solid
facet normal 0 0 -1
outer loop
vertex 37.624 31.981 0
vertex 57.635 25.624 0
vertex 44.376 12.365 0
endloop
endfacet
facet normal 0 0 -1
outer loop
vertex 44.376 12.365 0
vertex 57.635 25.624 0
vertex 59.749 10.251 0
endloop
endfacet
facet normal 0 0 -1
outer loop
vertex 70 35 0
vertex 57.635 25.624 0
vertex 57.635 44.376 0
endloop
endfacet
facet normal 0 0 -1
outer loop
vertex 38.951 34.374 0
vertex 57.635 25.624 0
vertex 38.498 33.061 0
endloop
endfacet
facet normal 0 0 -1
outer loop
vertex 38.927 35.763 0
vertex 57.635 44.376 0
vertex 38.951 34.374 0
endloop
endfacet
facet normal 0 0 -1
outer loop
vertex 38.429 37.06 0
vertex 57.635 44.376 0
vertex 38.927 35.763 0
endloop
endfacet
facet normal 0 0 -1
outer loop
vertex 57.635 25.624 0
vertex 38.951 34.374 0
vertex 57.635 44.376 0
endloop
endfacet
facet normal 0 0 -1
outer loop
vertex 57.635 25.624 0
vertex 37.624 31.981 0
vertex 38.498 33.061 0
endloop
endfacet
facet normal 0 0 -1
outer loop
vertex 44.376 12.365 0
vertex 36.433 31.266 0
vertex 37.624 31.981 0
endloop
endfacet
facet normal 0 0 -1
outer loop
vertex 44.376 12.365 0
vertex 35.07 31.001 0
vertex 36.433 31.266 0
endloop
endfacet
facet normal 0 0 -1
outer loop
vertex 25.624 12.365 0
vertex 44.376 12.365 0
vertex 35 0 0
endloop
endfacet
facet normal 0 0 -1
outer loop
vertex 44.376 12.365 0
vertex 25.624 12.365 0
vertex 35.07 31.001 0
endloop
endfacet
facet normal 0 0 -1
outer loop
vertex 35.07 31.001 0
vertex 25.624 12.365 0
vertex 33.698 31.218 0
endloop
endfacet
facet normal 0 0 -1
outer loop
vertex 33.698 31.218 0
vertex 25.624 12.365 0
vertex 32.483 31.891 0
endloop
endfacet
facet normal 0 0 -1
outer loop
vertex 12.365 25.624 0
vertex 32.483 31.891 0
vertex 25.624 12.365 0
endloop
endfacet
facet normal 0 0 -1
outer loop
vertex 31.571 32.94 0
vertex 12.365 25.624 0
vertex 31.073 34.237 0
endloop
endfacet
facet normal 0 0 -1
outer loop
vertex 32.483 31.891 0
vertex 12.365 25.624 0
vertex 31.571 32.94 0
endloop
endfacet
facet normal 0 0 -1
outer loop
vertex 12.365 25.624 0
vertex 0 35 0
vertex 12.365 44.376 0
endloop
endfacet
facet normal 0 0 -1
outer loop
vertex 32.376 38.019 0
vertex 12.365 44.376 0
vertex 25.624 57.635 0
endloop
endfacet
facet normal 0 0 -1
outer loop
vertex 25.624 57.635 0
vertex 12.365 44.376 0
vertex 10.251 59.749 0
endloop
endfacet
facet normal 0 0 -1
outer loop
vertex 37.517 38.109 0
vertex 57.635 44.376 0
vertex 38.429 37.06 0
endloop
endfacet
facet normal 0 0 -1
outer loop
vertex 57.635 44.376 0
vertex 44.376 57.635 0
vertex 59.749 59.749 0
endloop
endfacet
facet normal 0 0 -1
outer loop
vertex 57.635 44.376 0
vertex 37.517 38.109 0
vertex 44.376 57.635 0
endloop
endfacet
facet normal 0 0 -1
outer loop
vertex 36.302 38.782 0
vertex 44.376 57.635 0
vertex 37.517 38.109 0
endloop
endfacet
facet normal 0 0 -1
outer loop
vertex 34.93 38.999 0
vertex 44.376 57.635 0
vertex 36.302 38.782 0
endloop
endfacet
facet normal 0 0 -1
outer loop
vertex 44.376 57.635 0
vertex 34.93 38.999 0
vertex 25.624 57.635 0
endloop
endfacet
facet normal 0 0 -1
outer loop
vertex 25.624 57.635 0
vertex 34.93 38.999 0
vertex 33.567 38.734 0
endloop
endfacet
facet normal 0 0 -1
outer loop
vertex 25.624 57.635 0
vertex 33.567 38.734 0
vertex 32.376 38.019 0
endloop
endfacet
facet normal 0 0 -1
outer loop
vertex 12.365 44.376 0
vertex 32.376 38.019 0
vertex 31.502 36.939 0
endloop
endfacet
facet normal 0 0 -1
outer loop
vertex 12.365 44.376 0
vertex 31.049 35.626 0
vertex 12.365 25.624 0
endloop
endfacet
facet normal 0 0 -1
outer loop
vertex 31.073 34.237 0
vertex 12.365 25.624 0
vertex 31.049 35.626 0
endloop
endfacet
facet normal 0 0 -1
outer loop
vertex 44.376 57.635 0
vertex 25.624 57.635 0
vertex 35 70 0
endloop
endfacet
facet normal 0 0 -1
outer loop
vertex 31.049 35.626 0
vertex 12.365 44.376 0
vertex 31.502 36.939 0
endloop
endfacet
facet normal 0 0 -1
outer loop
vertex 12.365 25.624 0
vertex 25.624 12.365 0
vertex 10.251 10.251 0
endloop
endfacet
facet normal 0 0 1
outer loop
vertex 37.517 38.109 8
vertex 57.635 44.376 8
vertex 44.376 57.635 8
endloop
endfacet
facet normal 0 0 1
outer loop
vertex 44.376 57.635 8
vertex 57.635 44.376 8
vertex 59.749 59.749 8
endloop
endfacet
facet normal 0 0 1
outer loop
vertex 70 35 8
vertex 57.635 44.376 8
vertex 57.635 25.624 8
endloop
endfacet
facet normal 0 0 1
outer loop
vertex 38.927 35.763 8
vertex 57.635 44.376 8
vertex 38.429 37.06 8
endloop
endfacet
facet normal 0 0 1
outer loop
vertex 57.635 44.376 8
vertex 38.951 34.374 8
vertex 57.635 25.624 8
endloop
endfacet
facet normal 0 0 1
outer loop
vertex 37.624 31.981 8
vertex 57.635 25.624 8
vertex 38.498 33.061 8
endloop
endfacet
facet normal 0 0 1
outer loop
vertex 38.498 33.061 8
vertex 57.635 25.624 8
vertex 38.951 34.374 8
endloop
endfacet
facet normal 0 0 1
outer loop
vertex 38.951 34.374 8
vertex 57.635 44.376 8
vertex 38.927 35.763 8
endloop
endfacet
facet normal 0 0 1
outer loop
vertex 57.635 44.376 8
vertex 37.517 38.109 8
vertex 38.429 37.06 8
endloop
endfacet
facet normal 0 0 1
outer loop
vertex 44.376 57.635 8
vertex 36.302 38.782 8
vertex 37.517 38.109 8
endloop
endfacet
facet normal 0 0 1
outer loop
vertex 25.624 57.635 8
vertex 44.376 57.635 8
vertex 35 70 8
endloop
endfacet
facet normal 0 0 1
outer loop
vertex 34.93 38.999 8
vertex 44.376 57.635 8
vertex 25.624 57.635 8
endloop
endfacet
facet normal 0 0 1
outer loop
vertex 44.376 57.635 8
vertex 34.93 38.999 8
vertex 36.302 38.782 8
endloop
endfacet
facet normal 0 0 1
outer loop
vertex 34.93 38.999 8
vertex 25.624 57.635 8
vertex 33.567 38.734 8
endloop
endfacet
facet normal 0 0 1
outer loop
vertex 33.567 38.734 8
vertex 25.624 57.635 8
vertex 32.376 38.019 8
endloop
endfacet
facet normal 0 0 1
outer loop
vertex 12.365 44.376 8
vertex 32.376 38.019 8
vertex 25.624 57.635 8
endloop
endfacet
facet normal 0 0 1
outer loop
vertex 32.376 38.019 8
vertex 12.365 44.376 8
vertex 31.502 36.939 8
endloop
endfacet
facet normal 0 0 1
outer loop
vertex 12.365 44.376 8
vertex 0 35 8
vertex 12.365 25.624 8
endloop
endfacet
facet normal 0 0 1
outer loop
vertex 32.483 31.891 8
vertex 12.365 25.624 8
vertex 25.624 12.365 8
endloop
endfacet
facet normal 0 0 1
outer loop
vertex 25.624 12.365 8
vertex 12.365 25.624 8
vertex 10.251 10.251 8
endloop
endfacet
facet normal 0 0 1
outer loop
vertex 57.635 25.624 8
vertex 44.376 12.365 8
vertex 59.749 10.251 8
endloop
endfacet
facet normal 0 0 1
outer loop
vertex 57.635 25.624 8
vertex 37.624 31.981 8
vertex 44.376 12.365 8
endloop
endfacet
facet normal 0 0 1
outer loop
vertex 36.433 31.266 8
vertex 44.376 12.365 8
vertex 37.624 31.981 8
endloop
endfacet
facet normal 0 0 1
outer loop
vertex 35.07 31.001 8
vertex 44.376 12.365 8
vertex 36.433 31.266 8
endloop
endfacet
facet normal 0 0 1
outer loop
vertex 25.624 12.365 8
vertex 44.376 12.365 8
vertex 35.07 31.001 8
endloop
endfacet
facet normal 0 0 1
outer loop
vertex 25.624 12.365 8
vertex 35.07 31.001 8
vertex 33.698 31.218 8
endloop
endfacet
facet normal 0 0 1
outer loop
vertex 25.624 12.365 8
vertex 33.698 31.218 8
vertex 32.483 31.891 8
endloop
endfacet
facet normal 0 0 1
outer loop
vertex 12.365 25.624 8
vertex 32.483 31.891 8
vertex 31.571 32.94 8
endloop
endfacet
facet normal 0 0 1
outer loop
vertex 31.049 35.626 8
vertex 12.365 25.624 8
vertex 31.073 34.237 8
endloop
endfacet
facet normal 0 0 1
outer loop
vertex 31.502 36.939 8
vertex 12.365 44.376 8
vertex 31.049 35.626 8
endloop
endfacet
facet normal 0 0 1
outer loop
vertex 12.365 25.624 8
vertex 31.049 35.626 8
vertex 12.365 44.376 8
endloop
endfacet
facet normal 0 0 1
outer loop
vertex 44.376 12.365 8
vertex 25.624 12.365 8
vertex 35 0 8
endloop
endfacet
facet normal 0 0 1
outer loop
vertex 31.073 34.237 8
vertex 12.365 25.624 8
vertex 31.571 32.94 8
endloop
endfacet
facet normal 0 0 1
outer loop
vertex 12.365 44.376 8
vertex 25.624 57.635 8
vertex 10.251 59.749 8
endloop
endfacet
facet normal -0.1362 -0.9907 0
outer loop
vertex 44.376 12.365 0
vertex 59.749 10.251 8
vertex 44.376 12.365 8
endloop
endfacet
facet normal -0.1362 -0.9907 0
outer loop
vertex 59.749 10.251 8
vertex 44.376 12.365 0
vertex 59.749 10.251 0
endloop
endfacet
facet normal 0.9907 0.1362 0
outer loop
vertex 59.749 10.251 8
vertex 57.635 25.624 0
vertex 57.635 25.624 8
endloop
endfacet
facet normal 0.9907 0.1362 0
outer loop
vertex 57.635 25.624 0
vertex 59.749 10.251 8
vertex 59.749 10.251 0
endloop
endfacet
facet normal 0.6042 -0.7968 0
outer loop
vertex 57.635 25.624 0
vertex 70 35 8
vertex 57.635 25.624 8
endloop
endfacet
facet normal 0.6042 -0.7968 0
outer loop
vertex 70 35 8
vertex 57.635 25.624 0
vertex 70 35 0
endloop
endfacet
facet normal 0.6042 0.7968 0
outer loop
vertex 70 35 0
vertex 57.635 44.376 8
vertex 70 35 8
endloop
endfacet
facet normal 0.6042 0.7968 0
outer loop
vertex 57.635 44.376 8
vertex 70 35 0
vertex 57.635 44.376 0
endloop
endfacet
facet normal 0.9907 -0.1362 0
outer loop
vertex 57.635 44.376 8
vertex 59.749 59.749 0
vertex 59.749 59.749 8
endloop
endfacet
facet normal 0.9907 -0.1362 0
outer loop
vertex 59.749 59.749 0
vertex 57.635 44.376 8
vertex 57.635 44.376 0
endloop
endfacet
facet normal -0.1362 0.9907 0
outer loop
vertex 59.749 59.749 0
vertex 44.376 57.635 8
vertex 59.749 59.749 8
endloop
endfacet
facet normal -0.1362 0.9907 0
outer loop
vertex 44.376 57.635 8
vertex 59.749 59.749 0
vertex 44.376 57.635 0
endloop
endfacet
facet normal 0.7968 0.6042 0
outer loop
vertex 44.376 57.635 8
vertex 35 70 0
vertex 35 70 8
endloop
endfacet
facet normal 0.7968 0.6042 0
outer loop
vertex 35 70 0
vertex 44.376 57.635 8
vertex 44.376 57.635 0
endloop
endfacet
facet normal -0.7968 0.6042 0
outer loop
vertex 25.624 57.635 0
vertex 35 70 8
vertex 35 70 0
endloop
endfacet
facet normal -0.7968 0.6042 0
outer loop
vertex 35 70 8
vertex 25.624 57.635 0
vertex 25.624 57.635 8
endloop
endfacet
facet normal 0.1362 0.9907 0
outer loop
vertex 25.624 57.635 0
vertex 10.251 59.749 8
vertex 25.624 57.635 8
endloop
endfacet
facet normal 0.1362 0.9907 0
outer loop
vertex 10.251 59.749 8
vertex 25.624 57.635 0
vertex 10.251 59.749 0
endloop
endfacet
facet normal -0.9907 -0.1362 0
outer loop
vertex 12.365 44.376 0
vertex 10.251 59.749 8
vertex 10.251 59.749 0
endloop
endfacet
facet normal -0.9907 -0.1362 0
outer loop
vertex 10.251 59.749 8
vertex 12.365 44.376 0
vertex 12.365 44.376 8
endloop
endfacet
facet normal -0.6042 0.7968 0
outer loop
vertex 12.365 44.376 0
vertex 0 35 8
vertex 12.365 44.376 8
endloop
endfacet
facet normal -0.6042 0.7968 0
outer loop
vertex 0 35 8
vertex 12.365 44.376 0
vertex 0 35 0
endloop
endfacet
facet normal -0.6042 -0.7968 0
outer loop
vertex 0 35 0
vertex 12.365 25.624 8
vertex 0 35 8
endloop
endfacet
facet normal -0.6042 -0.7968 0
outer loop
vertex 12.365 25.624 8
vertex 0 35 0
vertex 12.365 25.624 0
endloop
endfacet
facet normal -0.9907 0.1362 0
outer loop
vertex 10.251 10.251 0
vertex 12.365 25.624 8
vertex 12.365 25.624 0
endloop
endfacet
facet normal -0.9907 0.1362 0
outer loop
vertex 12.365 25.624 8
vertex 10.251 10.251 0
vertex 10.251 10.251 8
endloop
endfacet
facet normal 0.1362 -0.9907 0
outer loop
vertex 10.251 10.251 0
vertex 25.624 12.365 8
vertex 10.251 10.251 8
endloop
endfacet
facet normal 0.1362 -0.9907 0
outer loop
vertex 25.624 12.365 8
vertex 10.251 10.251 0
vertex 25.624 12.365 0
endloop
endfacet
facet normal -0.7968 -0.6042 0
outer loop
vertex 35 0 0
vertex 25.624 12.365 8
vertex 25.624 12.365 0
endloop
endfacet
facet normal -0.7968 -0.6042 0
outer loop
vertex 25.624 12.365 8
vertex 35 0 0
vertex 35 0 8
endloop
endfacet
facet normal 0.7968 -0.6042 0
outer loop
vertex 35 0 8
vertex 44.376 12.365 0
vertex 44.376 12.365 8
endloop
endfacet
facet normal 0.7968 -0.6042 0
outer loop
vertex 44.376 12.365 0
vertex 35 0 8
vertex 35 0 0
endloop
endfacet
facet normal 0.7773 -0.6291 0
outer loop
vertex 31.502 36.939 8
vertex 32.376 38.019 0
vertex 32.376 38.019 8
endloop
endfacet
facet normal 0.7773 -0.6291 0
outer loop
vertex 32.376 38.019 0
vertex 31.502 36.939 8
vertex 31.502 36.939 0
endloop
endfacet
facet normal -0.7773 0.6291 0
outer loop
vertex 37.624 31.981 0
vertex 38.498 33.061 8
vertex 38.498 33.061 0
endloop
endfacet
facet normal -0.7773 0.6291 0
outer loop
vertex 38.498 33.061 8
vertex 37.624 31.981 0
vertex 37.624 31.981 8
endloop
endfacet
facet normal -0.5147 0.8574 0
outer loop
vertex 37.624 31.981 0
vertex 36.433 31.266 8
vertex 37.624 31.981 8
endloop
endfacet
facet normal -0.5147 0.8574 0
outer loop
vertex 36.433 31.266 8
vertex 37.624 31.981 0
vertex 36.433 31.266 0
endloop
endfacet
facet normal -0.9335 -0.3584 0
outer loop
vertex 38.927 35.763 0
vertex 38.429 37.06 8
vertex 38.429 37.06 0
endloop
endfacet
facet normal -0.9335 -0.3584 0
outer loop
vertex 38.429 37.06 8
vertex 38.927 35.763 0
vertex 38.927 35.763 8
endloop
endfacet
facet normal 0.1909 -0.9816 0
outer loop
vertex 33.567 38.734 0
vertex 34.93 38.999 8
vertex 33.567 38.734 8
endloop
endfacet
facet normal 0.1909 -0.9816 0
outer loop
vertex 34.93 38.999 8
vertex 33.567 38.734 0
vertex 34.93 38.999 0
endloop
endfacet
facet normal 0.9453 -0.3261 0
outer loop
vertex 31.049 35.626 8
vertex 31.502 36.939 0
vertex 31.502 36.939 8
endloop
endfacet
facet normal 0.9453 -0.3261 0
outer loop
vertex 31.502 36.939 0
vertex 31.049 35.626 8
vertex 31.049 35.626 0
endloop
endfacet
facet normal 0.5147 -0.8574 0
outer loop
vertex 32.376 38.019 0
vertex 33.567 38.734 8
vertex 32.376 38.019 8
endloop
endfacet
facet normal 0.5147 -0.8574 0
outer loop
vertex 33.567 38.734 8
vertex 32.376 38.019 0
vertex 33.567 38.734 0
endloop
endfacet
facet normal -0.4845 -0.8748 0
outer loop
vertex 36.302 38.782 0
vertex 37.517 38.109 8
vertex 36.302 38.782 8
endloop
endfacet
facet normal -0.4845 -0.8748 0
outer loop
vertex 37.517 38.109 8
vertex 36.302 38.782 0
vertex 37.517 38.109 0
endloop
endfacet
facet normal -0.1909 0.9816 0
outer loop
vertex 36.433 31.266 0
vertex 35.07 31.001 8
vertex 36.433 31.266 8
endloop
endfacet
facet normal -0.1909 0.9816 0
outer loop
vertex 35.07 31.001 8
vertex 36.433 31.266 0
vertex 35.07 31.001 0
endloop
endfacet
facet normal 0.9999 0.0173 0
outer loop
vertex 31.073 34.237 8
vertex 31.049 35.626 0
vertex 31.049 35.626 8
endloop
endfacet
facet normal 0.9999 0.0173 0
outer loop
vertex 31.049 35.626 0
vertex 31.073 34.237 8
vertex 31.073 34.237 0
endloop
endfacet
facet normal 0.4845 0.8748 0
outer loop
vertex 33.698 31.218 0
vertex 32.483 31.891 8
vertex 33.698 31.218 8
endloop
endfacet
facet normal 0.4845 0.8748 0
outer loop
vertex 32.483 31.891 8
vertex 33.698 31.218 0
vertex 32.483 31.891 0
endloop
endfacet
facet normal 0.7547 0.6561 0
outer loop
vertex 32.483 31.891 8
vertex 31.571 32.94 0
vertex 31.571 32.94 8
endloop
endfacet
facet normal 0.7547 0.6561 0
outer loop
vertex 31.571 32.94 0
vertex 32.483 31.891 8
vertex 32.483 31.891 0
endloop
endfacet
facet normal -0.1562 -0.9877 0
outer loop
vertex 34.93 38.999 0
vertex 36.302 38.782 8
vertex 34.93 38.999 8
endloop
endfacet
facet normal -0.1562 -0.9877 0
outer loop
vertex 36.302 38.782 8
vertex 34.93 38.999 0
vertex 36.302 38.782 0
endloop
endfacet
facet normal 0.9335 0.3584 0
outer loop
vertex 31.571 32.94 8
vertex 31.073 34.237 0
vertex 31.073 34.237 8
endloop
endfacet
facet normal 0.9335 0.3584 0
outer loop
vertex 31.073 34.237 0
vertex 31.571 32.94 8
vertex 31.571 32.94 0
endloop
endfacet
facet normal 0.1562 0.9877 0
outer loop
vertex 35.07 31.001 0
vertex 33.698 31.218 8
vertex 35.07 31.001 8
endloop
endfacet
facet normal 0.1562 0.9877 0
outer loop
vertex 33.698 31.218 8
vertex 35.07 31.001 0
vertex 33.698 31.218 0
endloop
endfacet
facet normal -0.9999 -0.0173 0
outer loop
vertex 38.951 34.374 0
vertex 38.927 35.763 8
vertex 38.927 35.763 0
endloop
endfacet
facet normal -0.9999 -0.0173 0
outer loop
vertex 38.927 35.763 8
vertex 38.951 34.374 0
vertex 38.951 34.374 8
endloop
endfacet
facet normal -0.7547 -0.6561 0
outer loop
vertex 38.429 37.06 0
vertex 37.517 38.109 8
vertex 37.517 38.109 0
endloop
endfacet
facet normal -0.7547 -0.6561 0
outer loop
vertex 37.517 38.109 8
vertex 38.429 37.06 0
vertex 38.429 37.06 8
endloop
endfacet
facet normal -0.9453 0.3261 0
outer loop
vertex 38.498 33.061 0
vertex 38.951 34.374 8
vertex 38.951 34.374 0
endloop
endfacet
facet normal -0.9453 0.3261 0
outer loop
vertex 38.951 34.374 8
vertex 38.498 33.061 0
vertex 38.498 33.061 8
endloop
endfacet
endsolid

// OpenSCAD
$fn = 32;

// ----------------------------------------------------------------------
// Star wheel: 8-point blunt, R35
// ----------------------------------------------------------------------

// --- parameters (mm) ---
n_points = 8;             // number of points / teeth
r_out = 35;               // tip radius
r_in = 24.5;              // root radius
bore_r = 4;               // centre bore radius
plate_t = 8;              // plate thickness, Z (extrusion height)
bore_d = 8;               // centre bore diameter

profile = [[70, 35], [57.635, 44.376], [59.749, 59.749], [44.376, 57.635], [35, 70], [25.624, 57.635], [10.251, 59.749], [12.365, 44.376], [0, 35], [12.365, 25.624], [10.251, 10.251], [25.624, 12.365], [35, 0], [44.376, 12.365], [59.749, 10.251], [57.635, 25.624]];  // primary outline, 16 points, counter clockwise
void_1 = [[38.927, 35.763], [38.429, 37.06], [37.517, 38.109], [36.302, 38.782], [34.93, 38.999], [33.567, 38.734], [32.376, 38.019], [31.502, 36.939], [31.049, 35.626], [31.073, 34.237], [31.571, 32.94], [32.483, 31.891], [33.698, 31.218], [35.07, 31.001], [36.433, 31.266], [37.624, 31.981], [38.498, 33.061], [38.951, 34.374]];  // centre bore, 18 points

// --- the one profile operation ---
difference() {
  linear_extrude(height = plate_t) polygon(points = profile);
  translate([0, 0, -1])
    linear_extrude(height = plate_t + 2) polygon(points = void_1);
}
